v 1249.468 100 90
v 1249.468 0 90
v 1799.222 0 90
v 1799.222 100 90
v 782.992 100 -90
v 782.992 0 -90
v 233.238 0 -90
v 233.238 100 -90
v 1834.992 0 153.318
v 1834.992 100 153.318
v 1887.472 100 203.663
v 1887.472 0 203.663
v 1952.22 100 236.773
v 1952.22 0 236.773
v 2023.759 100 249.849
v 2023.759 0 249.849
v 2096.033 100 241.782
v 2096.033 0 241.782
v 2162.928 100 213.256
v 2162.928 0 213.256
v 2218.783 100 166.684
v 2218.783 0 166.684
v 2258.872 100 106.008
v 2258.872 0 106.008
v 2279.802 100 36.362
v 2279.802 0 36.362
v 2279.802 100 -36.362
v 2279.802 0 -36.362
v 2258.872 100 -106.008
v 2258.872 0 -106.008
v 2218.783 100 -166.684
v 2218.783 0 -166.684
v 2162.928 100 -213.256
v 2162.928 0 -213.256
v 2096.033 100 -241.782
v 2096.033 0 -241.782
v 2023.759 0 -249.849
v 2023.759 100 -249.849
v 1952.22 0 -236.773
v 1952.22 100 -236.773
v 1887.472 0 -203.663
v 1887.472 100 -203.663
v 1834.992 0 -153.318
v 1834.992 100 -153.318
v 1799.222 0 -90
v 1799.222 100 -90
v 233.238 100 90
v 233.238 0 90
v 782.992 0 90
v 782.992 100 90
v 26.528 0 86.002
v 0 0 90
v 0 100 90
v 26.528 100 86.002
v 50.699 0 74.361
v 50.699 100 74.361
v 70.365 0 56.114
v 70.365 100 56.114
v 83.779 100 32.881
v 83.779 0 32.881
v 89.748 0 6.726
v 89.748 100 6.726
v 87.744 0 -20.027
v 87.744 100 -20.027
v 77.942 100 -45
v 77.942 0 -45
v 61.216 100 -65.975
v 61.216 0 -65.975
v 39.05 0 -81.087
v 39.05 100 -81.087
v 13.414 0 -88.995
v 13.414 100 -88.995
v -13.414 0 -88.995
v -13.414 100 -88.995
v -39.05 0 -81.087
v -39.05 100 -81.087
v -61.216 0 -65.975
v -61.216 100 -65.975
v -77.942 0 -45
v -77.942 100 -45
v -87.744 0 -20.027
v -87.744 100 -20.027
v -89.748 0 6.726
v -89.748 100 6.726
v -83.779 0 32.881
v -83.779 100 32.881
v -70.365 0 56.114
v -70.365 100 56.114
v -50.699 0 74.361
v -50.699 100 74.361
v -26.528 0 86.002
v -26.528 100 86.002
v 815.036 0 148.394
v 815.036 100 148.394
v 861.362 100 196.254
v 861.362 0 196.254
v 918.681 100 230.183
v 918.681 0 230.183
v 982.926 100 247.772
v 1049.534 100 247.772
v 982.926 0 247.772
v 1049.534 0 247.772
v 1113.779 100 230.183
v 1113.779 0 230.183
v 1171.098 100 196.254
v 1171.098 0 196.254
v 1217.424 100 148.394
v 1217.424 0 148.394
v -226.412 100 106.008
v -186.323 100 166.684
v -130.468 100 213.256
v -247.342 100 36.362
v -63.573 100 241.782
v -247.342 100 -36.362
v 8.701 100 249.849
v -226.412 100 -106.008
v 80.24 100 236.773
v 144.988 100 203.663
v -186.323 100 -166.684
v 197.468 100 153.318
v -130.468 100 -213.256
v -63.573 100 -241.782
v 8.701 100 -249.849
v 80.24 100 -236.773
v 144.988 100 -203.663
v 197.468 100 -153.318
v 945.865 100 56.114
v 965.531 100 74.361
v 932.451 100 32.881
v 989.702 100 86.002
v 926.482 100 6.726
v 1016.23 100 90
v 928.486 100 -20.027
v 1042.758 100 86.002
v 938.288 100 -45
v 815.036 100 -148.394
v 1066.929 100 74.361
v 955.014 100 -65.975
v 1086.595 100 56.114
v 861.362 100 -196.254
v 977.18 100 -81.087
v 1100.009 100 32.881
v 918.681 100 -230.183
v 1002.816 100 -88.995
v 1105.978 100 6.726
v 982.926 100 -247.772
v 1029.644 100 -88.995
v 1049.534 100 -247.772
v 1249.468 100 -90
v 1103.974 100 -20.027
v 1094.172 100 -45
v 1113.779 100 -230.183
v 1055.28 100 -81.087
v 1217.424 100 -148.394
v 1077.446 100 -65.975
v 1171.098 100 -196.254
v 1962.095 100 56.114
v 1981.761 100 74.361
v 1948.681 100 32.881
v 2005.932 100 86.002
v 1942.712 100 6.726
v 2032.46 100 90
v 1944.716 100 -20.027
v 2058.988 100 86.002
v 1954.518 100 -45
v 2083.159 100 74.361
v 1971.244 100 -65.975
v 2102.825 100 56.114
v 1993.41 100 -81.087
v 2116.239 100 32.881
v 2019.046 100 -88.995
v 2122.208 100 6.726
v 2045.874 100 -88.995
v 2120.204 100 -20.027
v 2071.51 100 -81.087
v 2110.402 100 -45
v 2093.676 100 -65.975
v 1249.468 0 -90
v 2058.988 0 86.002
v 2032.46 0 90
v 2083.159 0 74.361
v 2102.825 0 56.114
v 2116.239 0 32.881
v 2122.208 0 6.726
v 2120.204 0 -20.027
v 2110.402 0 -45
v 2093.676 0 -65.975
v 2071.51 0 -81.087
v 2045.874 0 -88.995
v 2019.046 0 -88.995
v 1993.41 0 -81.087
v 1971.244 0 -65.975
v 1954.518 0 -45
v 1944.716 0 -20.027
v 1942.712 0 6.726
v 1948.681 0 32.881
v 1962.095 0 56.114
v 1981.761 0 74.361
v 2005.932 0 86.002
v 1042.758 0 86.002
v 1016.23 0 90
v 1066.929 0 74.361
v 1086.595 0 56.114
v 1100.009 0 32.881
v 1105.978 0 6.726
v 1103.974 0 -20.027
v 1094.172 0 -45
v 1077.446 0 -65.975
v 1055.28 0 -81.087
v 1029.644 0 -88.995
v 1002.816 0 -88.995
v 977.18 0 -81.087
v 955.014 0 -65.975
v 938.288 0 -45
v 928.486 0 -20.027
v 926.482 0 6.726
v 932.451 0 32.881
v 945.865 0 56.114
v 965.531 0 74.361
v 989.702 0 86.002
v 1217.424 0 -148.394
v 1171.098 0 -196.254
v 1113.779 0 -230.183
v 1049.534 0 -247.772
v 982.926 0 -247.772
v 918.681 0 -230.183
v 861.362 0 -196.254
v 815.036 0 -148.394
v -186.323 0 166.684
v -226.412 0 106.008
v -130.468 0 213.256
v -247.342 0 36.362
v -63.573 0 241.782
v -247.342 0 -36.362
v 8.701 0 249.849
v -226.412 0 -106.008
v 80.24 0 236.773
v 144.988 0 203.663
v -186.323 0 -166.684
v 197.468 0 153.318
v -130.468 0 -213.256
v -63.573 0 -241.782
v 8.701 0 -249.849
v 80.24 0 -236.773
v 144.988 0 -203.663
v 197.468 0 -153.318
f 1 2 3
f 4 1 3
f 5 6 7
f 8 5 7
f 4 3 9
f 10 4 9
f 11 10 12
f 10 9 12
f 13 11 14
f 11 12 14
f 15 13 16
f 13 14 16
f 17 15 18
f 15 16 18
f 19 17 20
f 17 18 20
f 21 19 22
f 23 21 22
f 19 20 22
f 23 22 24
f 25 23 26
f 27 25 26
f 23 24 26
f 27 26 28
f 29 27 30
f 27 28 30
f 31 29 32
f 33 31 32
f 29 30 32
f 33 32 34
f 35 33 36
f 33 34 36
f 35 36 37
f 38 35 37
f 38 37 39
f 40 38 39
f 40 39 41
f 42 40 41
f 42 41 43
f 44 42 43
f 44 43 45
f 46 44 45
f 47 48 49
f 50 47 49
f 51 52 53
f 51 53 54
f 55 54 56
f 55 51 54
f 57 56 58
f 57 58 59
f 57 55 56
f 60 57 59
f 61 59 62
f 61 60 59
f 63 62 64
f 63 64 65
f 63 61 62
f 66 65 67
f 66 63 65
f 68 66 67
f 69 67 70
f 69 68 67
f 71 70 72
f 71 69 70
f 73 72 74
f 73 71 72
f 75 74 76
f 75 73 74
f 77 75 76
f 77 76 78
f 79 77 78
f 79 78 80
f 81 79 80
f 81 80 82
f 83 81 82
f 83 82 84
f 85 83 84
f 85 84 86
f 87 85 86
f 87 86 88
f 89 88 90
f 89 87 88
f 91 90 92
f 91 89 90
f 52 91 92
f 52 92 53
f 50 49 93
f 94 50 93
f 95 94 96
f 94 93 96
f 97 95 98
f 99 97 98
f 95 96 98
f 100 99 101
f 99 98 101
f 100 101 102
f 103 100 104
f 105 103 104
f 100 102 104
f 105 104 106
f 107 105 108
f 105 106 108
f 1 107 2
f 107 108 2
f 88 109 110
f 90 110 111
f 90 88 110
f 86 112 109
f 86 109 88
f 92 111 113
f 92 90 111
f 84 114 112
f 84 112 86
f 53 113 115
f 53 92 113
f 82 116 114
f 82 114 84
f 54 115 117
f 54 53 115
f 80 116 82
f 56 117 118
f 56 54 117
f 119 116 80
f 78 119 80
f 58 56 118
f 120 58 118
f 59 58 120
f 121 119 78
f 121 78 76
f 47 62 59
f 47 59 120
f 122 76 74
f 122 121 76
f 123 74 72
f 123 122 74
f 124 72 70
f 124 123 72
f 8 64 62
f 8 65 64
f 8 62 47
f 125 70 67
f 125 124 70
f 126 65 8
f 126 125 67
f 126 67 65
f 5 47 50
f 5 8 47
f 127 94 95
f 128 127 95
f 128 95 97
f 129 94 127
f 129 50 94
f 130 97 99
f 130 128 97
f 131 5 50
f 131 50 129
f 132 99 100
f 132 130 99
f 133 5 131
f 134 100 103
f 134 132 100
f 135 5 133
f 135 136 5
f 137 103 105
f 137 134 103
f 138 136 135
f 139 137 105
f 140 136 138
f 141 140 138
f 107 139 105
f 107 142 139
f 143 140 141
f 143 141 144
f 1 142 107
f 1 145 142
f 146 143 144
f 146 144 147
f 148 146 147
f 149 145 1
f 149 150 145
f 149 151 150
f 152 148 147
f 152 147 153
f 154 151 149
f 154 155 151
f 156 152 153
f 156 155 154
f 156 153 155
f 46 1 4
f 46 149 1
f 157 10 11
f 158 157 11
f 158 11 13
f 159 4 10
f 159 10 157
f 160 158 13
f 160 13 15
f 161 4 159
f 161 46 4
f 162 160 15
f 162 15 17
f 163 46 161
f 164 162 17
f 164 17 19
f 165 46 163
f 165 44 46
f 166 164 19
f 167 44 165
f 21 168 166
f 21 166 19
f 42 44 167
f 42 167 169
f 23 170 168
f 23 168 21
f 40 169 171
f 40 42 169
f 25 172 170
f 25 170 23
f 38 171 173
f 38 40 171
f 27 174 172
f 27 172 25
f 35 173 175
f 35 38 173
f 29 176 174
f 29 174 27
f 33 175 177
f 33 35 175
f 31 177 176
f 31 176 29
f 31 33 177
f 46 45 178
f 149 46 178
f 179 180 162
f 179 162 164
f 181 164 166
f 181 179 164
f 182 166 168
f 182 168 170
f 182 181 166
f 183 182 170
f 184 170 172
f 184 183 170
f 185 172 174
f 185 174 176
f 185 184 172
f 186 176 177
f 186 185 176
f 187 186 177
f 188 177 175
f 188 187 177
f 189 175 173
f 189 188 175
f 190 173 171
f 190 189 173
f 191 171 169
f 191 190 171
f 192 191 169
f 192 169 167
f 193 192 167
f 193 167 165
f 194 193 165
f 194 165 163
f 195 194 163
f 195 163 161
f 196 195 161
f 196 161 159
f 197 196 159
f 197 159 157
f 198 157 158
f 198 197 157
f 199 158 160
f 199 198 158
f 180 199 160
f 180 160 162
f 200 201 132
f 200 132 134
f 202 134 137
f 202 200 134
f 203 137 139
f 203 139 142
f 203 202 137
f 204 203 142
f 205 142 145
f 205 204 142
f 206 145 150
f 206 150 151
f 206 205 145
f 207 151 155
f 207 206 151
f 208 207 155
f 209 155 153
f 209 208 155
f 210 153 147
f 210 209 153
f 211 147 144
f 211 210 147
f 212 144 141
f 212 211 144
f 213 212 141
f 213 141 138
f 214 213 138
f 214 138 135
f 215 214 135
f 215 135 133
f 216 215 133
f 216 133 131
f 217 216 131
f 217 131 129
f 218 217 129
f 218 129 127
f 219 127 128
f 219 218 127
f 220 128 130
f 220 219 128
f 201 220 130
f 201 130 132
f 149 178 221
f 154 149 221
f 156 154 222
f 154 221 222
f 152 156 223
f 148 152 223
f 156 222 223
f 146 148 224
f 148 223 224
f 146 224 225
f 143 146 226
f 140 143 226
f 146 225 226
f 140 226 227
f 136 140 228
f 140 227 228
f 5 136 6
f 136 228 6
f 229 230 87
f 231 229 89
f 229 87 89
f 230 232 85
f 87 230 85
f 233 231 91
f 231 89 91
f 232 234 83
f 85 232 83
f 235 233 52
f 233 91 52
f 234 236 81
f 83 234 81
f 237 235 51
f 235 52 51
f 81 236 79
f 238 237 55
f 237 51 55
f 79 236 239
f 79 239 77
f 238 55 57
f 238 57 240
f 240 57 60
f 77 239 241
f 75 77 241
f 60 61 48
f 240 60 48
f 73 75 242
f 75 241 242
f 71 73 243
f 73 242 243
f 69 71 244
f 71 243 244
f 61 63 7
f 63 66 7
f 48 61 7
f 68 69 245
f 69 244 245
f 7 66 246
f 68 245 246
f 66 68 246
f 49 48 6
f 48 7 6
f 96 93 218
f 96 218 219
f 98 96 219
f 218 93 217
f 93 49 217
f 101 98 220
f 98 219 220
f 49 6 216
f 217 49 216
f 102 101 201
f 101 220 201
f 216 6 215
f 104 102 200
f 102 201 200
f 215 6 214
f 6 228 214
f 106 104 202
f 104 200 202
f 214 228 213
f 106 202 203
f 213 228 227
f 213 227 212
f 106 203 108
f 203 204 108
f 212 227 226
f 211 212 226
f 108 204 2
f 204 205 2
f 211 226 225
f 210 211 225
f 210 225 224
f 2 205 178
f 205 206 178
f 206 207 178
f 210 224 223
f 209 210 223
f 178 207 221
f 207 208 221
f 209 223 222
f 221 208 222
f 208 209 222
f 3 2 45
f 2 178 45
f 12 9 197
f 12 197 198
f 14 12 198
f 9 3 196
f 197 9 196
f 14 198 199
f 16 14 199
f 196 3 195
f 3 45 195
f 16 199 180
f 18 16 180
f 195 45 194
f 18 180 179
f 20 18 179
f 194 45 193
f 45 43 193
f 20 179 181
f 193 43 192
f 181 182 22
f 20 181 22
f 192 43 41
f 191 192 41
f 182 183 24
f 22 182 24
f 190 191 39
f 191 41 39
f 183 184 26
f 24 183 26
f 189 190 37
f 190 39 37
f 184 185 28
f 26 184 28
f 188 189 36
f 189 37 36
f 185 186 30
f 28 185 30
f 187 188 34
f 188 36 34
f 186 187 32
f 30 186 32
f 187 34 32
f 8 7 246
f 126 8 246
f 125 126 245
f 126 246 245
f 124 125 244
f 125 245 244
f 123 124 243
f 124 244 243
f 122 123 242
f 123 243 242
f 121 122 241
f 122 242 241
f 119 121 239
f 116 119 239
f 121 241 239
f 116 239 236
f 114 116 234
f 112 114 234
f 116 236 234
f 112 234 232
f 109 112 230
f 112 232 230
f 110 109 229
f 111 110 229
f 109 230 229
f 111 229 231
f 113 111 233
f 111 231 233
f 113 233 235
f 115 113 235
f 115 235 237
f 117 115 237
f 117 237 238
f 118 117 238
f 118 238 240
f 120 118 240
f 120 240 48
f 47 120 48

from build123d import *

# Parameters (mm, degrees)
SKETCH1_R           = 90
BOSS_EXTRUDE1_DEPTH = 100


with BuildPart() as part:
    # Sketch1 → Boss-Extrude1 (new body)
    with BuildSketch(Plane(origin=(0, 0, 0), x_dir=(1, 0, 0), z_dir=(0, 1, 0))):
        with BuildLine():
            ThreePointArc((233.238075794, 90), (-250, 0), (233.238075794, -90))
            Line((233.238075794, -90), (782.991924206, -90))
            ThreePointArc((782.991924206, -90), (1016.23, -250), (1249.468075794, -90))
            Line((1249.468075794, -90), (1799.221924206, -90))
            ThreePointArc((1799.221924206, -90), (2282.46, 0), (1799.221924206, 90))
            Line((1799.221924206, 90), (1249.468075794, 90))
            ThreePointArc((1249.468075794, 90), (1016.23, 250), (782.991924206, 90))
            Line((782.991924206, 90), (233.238075794, 90))
        make_face()
        with Locations(Location((1016.23, 0, 0), (0, 0, 270))):
            Circle(SKETCH1_R, mode=Mode.SUBTRACT)
        with Locations(Location((0, 0, 0), (0, 0, 270))):
            Circle(SKETCH1_R, mode=Mode.SUBTRACT)
        with Locations(Location((2032.46, 0, 0), (0, 0, 270))):
            Circle(SKETCH1_R, mode=Mode.SUBTRACT)
    extrude(amount=BOSS_EXTRUDE1_DEPTH)


solid = part.part
